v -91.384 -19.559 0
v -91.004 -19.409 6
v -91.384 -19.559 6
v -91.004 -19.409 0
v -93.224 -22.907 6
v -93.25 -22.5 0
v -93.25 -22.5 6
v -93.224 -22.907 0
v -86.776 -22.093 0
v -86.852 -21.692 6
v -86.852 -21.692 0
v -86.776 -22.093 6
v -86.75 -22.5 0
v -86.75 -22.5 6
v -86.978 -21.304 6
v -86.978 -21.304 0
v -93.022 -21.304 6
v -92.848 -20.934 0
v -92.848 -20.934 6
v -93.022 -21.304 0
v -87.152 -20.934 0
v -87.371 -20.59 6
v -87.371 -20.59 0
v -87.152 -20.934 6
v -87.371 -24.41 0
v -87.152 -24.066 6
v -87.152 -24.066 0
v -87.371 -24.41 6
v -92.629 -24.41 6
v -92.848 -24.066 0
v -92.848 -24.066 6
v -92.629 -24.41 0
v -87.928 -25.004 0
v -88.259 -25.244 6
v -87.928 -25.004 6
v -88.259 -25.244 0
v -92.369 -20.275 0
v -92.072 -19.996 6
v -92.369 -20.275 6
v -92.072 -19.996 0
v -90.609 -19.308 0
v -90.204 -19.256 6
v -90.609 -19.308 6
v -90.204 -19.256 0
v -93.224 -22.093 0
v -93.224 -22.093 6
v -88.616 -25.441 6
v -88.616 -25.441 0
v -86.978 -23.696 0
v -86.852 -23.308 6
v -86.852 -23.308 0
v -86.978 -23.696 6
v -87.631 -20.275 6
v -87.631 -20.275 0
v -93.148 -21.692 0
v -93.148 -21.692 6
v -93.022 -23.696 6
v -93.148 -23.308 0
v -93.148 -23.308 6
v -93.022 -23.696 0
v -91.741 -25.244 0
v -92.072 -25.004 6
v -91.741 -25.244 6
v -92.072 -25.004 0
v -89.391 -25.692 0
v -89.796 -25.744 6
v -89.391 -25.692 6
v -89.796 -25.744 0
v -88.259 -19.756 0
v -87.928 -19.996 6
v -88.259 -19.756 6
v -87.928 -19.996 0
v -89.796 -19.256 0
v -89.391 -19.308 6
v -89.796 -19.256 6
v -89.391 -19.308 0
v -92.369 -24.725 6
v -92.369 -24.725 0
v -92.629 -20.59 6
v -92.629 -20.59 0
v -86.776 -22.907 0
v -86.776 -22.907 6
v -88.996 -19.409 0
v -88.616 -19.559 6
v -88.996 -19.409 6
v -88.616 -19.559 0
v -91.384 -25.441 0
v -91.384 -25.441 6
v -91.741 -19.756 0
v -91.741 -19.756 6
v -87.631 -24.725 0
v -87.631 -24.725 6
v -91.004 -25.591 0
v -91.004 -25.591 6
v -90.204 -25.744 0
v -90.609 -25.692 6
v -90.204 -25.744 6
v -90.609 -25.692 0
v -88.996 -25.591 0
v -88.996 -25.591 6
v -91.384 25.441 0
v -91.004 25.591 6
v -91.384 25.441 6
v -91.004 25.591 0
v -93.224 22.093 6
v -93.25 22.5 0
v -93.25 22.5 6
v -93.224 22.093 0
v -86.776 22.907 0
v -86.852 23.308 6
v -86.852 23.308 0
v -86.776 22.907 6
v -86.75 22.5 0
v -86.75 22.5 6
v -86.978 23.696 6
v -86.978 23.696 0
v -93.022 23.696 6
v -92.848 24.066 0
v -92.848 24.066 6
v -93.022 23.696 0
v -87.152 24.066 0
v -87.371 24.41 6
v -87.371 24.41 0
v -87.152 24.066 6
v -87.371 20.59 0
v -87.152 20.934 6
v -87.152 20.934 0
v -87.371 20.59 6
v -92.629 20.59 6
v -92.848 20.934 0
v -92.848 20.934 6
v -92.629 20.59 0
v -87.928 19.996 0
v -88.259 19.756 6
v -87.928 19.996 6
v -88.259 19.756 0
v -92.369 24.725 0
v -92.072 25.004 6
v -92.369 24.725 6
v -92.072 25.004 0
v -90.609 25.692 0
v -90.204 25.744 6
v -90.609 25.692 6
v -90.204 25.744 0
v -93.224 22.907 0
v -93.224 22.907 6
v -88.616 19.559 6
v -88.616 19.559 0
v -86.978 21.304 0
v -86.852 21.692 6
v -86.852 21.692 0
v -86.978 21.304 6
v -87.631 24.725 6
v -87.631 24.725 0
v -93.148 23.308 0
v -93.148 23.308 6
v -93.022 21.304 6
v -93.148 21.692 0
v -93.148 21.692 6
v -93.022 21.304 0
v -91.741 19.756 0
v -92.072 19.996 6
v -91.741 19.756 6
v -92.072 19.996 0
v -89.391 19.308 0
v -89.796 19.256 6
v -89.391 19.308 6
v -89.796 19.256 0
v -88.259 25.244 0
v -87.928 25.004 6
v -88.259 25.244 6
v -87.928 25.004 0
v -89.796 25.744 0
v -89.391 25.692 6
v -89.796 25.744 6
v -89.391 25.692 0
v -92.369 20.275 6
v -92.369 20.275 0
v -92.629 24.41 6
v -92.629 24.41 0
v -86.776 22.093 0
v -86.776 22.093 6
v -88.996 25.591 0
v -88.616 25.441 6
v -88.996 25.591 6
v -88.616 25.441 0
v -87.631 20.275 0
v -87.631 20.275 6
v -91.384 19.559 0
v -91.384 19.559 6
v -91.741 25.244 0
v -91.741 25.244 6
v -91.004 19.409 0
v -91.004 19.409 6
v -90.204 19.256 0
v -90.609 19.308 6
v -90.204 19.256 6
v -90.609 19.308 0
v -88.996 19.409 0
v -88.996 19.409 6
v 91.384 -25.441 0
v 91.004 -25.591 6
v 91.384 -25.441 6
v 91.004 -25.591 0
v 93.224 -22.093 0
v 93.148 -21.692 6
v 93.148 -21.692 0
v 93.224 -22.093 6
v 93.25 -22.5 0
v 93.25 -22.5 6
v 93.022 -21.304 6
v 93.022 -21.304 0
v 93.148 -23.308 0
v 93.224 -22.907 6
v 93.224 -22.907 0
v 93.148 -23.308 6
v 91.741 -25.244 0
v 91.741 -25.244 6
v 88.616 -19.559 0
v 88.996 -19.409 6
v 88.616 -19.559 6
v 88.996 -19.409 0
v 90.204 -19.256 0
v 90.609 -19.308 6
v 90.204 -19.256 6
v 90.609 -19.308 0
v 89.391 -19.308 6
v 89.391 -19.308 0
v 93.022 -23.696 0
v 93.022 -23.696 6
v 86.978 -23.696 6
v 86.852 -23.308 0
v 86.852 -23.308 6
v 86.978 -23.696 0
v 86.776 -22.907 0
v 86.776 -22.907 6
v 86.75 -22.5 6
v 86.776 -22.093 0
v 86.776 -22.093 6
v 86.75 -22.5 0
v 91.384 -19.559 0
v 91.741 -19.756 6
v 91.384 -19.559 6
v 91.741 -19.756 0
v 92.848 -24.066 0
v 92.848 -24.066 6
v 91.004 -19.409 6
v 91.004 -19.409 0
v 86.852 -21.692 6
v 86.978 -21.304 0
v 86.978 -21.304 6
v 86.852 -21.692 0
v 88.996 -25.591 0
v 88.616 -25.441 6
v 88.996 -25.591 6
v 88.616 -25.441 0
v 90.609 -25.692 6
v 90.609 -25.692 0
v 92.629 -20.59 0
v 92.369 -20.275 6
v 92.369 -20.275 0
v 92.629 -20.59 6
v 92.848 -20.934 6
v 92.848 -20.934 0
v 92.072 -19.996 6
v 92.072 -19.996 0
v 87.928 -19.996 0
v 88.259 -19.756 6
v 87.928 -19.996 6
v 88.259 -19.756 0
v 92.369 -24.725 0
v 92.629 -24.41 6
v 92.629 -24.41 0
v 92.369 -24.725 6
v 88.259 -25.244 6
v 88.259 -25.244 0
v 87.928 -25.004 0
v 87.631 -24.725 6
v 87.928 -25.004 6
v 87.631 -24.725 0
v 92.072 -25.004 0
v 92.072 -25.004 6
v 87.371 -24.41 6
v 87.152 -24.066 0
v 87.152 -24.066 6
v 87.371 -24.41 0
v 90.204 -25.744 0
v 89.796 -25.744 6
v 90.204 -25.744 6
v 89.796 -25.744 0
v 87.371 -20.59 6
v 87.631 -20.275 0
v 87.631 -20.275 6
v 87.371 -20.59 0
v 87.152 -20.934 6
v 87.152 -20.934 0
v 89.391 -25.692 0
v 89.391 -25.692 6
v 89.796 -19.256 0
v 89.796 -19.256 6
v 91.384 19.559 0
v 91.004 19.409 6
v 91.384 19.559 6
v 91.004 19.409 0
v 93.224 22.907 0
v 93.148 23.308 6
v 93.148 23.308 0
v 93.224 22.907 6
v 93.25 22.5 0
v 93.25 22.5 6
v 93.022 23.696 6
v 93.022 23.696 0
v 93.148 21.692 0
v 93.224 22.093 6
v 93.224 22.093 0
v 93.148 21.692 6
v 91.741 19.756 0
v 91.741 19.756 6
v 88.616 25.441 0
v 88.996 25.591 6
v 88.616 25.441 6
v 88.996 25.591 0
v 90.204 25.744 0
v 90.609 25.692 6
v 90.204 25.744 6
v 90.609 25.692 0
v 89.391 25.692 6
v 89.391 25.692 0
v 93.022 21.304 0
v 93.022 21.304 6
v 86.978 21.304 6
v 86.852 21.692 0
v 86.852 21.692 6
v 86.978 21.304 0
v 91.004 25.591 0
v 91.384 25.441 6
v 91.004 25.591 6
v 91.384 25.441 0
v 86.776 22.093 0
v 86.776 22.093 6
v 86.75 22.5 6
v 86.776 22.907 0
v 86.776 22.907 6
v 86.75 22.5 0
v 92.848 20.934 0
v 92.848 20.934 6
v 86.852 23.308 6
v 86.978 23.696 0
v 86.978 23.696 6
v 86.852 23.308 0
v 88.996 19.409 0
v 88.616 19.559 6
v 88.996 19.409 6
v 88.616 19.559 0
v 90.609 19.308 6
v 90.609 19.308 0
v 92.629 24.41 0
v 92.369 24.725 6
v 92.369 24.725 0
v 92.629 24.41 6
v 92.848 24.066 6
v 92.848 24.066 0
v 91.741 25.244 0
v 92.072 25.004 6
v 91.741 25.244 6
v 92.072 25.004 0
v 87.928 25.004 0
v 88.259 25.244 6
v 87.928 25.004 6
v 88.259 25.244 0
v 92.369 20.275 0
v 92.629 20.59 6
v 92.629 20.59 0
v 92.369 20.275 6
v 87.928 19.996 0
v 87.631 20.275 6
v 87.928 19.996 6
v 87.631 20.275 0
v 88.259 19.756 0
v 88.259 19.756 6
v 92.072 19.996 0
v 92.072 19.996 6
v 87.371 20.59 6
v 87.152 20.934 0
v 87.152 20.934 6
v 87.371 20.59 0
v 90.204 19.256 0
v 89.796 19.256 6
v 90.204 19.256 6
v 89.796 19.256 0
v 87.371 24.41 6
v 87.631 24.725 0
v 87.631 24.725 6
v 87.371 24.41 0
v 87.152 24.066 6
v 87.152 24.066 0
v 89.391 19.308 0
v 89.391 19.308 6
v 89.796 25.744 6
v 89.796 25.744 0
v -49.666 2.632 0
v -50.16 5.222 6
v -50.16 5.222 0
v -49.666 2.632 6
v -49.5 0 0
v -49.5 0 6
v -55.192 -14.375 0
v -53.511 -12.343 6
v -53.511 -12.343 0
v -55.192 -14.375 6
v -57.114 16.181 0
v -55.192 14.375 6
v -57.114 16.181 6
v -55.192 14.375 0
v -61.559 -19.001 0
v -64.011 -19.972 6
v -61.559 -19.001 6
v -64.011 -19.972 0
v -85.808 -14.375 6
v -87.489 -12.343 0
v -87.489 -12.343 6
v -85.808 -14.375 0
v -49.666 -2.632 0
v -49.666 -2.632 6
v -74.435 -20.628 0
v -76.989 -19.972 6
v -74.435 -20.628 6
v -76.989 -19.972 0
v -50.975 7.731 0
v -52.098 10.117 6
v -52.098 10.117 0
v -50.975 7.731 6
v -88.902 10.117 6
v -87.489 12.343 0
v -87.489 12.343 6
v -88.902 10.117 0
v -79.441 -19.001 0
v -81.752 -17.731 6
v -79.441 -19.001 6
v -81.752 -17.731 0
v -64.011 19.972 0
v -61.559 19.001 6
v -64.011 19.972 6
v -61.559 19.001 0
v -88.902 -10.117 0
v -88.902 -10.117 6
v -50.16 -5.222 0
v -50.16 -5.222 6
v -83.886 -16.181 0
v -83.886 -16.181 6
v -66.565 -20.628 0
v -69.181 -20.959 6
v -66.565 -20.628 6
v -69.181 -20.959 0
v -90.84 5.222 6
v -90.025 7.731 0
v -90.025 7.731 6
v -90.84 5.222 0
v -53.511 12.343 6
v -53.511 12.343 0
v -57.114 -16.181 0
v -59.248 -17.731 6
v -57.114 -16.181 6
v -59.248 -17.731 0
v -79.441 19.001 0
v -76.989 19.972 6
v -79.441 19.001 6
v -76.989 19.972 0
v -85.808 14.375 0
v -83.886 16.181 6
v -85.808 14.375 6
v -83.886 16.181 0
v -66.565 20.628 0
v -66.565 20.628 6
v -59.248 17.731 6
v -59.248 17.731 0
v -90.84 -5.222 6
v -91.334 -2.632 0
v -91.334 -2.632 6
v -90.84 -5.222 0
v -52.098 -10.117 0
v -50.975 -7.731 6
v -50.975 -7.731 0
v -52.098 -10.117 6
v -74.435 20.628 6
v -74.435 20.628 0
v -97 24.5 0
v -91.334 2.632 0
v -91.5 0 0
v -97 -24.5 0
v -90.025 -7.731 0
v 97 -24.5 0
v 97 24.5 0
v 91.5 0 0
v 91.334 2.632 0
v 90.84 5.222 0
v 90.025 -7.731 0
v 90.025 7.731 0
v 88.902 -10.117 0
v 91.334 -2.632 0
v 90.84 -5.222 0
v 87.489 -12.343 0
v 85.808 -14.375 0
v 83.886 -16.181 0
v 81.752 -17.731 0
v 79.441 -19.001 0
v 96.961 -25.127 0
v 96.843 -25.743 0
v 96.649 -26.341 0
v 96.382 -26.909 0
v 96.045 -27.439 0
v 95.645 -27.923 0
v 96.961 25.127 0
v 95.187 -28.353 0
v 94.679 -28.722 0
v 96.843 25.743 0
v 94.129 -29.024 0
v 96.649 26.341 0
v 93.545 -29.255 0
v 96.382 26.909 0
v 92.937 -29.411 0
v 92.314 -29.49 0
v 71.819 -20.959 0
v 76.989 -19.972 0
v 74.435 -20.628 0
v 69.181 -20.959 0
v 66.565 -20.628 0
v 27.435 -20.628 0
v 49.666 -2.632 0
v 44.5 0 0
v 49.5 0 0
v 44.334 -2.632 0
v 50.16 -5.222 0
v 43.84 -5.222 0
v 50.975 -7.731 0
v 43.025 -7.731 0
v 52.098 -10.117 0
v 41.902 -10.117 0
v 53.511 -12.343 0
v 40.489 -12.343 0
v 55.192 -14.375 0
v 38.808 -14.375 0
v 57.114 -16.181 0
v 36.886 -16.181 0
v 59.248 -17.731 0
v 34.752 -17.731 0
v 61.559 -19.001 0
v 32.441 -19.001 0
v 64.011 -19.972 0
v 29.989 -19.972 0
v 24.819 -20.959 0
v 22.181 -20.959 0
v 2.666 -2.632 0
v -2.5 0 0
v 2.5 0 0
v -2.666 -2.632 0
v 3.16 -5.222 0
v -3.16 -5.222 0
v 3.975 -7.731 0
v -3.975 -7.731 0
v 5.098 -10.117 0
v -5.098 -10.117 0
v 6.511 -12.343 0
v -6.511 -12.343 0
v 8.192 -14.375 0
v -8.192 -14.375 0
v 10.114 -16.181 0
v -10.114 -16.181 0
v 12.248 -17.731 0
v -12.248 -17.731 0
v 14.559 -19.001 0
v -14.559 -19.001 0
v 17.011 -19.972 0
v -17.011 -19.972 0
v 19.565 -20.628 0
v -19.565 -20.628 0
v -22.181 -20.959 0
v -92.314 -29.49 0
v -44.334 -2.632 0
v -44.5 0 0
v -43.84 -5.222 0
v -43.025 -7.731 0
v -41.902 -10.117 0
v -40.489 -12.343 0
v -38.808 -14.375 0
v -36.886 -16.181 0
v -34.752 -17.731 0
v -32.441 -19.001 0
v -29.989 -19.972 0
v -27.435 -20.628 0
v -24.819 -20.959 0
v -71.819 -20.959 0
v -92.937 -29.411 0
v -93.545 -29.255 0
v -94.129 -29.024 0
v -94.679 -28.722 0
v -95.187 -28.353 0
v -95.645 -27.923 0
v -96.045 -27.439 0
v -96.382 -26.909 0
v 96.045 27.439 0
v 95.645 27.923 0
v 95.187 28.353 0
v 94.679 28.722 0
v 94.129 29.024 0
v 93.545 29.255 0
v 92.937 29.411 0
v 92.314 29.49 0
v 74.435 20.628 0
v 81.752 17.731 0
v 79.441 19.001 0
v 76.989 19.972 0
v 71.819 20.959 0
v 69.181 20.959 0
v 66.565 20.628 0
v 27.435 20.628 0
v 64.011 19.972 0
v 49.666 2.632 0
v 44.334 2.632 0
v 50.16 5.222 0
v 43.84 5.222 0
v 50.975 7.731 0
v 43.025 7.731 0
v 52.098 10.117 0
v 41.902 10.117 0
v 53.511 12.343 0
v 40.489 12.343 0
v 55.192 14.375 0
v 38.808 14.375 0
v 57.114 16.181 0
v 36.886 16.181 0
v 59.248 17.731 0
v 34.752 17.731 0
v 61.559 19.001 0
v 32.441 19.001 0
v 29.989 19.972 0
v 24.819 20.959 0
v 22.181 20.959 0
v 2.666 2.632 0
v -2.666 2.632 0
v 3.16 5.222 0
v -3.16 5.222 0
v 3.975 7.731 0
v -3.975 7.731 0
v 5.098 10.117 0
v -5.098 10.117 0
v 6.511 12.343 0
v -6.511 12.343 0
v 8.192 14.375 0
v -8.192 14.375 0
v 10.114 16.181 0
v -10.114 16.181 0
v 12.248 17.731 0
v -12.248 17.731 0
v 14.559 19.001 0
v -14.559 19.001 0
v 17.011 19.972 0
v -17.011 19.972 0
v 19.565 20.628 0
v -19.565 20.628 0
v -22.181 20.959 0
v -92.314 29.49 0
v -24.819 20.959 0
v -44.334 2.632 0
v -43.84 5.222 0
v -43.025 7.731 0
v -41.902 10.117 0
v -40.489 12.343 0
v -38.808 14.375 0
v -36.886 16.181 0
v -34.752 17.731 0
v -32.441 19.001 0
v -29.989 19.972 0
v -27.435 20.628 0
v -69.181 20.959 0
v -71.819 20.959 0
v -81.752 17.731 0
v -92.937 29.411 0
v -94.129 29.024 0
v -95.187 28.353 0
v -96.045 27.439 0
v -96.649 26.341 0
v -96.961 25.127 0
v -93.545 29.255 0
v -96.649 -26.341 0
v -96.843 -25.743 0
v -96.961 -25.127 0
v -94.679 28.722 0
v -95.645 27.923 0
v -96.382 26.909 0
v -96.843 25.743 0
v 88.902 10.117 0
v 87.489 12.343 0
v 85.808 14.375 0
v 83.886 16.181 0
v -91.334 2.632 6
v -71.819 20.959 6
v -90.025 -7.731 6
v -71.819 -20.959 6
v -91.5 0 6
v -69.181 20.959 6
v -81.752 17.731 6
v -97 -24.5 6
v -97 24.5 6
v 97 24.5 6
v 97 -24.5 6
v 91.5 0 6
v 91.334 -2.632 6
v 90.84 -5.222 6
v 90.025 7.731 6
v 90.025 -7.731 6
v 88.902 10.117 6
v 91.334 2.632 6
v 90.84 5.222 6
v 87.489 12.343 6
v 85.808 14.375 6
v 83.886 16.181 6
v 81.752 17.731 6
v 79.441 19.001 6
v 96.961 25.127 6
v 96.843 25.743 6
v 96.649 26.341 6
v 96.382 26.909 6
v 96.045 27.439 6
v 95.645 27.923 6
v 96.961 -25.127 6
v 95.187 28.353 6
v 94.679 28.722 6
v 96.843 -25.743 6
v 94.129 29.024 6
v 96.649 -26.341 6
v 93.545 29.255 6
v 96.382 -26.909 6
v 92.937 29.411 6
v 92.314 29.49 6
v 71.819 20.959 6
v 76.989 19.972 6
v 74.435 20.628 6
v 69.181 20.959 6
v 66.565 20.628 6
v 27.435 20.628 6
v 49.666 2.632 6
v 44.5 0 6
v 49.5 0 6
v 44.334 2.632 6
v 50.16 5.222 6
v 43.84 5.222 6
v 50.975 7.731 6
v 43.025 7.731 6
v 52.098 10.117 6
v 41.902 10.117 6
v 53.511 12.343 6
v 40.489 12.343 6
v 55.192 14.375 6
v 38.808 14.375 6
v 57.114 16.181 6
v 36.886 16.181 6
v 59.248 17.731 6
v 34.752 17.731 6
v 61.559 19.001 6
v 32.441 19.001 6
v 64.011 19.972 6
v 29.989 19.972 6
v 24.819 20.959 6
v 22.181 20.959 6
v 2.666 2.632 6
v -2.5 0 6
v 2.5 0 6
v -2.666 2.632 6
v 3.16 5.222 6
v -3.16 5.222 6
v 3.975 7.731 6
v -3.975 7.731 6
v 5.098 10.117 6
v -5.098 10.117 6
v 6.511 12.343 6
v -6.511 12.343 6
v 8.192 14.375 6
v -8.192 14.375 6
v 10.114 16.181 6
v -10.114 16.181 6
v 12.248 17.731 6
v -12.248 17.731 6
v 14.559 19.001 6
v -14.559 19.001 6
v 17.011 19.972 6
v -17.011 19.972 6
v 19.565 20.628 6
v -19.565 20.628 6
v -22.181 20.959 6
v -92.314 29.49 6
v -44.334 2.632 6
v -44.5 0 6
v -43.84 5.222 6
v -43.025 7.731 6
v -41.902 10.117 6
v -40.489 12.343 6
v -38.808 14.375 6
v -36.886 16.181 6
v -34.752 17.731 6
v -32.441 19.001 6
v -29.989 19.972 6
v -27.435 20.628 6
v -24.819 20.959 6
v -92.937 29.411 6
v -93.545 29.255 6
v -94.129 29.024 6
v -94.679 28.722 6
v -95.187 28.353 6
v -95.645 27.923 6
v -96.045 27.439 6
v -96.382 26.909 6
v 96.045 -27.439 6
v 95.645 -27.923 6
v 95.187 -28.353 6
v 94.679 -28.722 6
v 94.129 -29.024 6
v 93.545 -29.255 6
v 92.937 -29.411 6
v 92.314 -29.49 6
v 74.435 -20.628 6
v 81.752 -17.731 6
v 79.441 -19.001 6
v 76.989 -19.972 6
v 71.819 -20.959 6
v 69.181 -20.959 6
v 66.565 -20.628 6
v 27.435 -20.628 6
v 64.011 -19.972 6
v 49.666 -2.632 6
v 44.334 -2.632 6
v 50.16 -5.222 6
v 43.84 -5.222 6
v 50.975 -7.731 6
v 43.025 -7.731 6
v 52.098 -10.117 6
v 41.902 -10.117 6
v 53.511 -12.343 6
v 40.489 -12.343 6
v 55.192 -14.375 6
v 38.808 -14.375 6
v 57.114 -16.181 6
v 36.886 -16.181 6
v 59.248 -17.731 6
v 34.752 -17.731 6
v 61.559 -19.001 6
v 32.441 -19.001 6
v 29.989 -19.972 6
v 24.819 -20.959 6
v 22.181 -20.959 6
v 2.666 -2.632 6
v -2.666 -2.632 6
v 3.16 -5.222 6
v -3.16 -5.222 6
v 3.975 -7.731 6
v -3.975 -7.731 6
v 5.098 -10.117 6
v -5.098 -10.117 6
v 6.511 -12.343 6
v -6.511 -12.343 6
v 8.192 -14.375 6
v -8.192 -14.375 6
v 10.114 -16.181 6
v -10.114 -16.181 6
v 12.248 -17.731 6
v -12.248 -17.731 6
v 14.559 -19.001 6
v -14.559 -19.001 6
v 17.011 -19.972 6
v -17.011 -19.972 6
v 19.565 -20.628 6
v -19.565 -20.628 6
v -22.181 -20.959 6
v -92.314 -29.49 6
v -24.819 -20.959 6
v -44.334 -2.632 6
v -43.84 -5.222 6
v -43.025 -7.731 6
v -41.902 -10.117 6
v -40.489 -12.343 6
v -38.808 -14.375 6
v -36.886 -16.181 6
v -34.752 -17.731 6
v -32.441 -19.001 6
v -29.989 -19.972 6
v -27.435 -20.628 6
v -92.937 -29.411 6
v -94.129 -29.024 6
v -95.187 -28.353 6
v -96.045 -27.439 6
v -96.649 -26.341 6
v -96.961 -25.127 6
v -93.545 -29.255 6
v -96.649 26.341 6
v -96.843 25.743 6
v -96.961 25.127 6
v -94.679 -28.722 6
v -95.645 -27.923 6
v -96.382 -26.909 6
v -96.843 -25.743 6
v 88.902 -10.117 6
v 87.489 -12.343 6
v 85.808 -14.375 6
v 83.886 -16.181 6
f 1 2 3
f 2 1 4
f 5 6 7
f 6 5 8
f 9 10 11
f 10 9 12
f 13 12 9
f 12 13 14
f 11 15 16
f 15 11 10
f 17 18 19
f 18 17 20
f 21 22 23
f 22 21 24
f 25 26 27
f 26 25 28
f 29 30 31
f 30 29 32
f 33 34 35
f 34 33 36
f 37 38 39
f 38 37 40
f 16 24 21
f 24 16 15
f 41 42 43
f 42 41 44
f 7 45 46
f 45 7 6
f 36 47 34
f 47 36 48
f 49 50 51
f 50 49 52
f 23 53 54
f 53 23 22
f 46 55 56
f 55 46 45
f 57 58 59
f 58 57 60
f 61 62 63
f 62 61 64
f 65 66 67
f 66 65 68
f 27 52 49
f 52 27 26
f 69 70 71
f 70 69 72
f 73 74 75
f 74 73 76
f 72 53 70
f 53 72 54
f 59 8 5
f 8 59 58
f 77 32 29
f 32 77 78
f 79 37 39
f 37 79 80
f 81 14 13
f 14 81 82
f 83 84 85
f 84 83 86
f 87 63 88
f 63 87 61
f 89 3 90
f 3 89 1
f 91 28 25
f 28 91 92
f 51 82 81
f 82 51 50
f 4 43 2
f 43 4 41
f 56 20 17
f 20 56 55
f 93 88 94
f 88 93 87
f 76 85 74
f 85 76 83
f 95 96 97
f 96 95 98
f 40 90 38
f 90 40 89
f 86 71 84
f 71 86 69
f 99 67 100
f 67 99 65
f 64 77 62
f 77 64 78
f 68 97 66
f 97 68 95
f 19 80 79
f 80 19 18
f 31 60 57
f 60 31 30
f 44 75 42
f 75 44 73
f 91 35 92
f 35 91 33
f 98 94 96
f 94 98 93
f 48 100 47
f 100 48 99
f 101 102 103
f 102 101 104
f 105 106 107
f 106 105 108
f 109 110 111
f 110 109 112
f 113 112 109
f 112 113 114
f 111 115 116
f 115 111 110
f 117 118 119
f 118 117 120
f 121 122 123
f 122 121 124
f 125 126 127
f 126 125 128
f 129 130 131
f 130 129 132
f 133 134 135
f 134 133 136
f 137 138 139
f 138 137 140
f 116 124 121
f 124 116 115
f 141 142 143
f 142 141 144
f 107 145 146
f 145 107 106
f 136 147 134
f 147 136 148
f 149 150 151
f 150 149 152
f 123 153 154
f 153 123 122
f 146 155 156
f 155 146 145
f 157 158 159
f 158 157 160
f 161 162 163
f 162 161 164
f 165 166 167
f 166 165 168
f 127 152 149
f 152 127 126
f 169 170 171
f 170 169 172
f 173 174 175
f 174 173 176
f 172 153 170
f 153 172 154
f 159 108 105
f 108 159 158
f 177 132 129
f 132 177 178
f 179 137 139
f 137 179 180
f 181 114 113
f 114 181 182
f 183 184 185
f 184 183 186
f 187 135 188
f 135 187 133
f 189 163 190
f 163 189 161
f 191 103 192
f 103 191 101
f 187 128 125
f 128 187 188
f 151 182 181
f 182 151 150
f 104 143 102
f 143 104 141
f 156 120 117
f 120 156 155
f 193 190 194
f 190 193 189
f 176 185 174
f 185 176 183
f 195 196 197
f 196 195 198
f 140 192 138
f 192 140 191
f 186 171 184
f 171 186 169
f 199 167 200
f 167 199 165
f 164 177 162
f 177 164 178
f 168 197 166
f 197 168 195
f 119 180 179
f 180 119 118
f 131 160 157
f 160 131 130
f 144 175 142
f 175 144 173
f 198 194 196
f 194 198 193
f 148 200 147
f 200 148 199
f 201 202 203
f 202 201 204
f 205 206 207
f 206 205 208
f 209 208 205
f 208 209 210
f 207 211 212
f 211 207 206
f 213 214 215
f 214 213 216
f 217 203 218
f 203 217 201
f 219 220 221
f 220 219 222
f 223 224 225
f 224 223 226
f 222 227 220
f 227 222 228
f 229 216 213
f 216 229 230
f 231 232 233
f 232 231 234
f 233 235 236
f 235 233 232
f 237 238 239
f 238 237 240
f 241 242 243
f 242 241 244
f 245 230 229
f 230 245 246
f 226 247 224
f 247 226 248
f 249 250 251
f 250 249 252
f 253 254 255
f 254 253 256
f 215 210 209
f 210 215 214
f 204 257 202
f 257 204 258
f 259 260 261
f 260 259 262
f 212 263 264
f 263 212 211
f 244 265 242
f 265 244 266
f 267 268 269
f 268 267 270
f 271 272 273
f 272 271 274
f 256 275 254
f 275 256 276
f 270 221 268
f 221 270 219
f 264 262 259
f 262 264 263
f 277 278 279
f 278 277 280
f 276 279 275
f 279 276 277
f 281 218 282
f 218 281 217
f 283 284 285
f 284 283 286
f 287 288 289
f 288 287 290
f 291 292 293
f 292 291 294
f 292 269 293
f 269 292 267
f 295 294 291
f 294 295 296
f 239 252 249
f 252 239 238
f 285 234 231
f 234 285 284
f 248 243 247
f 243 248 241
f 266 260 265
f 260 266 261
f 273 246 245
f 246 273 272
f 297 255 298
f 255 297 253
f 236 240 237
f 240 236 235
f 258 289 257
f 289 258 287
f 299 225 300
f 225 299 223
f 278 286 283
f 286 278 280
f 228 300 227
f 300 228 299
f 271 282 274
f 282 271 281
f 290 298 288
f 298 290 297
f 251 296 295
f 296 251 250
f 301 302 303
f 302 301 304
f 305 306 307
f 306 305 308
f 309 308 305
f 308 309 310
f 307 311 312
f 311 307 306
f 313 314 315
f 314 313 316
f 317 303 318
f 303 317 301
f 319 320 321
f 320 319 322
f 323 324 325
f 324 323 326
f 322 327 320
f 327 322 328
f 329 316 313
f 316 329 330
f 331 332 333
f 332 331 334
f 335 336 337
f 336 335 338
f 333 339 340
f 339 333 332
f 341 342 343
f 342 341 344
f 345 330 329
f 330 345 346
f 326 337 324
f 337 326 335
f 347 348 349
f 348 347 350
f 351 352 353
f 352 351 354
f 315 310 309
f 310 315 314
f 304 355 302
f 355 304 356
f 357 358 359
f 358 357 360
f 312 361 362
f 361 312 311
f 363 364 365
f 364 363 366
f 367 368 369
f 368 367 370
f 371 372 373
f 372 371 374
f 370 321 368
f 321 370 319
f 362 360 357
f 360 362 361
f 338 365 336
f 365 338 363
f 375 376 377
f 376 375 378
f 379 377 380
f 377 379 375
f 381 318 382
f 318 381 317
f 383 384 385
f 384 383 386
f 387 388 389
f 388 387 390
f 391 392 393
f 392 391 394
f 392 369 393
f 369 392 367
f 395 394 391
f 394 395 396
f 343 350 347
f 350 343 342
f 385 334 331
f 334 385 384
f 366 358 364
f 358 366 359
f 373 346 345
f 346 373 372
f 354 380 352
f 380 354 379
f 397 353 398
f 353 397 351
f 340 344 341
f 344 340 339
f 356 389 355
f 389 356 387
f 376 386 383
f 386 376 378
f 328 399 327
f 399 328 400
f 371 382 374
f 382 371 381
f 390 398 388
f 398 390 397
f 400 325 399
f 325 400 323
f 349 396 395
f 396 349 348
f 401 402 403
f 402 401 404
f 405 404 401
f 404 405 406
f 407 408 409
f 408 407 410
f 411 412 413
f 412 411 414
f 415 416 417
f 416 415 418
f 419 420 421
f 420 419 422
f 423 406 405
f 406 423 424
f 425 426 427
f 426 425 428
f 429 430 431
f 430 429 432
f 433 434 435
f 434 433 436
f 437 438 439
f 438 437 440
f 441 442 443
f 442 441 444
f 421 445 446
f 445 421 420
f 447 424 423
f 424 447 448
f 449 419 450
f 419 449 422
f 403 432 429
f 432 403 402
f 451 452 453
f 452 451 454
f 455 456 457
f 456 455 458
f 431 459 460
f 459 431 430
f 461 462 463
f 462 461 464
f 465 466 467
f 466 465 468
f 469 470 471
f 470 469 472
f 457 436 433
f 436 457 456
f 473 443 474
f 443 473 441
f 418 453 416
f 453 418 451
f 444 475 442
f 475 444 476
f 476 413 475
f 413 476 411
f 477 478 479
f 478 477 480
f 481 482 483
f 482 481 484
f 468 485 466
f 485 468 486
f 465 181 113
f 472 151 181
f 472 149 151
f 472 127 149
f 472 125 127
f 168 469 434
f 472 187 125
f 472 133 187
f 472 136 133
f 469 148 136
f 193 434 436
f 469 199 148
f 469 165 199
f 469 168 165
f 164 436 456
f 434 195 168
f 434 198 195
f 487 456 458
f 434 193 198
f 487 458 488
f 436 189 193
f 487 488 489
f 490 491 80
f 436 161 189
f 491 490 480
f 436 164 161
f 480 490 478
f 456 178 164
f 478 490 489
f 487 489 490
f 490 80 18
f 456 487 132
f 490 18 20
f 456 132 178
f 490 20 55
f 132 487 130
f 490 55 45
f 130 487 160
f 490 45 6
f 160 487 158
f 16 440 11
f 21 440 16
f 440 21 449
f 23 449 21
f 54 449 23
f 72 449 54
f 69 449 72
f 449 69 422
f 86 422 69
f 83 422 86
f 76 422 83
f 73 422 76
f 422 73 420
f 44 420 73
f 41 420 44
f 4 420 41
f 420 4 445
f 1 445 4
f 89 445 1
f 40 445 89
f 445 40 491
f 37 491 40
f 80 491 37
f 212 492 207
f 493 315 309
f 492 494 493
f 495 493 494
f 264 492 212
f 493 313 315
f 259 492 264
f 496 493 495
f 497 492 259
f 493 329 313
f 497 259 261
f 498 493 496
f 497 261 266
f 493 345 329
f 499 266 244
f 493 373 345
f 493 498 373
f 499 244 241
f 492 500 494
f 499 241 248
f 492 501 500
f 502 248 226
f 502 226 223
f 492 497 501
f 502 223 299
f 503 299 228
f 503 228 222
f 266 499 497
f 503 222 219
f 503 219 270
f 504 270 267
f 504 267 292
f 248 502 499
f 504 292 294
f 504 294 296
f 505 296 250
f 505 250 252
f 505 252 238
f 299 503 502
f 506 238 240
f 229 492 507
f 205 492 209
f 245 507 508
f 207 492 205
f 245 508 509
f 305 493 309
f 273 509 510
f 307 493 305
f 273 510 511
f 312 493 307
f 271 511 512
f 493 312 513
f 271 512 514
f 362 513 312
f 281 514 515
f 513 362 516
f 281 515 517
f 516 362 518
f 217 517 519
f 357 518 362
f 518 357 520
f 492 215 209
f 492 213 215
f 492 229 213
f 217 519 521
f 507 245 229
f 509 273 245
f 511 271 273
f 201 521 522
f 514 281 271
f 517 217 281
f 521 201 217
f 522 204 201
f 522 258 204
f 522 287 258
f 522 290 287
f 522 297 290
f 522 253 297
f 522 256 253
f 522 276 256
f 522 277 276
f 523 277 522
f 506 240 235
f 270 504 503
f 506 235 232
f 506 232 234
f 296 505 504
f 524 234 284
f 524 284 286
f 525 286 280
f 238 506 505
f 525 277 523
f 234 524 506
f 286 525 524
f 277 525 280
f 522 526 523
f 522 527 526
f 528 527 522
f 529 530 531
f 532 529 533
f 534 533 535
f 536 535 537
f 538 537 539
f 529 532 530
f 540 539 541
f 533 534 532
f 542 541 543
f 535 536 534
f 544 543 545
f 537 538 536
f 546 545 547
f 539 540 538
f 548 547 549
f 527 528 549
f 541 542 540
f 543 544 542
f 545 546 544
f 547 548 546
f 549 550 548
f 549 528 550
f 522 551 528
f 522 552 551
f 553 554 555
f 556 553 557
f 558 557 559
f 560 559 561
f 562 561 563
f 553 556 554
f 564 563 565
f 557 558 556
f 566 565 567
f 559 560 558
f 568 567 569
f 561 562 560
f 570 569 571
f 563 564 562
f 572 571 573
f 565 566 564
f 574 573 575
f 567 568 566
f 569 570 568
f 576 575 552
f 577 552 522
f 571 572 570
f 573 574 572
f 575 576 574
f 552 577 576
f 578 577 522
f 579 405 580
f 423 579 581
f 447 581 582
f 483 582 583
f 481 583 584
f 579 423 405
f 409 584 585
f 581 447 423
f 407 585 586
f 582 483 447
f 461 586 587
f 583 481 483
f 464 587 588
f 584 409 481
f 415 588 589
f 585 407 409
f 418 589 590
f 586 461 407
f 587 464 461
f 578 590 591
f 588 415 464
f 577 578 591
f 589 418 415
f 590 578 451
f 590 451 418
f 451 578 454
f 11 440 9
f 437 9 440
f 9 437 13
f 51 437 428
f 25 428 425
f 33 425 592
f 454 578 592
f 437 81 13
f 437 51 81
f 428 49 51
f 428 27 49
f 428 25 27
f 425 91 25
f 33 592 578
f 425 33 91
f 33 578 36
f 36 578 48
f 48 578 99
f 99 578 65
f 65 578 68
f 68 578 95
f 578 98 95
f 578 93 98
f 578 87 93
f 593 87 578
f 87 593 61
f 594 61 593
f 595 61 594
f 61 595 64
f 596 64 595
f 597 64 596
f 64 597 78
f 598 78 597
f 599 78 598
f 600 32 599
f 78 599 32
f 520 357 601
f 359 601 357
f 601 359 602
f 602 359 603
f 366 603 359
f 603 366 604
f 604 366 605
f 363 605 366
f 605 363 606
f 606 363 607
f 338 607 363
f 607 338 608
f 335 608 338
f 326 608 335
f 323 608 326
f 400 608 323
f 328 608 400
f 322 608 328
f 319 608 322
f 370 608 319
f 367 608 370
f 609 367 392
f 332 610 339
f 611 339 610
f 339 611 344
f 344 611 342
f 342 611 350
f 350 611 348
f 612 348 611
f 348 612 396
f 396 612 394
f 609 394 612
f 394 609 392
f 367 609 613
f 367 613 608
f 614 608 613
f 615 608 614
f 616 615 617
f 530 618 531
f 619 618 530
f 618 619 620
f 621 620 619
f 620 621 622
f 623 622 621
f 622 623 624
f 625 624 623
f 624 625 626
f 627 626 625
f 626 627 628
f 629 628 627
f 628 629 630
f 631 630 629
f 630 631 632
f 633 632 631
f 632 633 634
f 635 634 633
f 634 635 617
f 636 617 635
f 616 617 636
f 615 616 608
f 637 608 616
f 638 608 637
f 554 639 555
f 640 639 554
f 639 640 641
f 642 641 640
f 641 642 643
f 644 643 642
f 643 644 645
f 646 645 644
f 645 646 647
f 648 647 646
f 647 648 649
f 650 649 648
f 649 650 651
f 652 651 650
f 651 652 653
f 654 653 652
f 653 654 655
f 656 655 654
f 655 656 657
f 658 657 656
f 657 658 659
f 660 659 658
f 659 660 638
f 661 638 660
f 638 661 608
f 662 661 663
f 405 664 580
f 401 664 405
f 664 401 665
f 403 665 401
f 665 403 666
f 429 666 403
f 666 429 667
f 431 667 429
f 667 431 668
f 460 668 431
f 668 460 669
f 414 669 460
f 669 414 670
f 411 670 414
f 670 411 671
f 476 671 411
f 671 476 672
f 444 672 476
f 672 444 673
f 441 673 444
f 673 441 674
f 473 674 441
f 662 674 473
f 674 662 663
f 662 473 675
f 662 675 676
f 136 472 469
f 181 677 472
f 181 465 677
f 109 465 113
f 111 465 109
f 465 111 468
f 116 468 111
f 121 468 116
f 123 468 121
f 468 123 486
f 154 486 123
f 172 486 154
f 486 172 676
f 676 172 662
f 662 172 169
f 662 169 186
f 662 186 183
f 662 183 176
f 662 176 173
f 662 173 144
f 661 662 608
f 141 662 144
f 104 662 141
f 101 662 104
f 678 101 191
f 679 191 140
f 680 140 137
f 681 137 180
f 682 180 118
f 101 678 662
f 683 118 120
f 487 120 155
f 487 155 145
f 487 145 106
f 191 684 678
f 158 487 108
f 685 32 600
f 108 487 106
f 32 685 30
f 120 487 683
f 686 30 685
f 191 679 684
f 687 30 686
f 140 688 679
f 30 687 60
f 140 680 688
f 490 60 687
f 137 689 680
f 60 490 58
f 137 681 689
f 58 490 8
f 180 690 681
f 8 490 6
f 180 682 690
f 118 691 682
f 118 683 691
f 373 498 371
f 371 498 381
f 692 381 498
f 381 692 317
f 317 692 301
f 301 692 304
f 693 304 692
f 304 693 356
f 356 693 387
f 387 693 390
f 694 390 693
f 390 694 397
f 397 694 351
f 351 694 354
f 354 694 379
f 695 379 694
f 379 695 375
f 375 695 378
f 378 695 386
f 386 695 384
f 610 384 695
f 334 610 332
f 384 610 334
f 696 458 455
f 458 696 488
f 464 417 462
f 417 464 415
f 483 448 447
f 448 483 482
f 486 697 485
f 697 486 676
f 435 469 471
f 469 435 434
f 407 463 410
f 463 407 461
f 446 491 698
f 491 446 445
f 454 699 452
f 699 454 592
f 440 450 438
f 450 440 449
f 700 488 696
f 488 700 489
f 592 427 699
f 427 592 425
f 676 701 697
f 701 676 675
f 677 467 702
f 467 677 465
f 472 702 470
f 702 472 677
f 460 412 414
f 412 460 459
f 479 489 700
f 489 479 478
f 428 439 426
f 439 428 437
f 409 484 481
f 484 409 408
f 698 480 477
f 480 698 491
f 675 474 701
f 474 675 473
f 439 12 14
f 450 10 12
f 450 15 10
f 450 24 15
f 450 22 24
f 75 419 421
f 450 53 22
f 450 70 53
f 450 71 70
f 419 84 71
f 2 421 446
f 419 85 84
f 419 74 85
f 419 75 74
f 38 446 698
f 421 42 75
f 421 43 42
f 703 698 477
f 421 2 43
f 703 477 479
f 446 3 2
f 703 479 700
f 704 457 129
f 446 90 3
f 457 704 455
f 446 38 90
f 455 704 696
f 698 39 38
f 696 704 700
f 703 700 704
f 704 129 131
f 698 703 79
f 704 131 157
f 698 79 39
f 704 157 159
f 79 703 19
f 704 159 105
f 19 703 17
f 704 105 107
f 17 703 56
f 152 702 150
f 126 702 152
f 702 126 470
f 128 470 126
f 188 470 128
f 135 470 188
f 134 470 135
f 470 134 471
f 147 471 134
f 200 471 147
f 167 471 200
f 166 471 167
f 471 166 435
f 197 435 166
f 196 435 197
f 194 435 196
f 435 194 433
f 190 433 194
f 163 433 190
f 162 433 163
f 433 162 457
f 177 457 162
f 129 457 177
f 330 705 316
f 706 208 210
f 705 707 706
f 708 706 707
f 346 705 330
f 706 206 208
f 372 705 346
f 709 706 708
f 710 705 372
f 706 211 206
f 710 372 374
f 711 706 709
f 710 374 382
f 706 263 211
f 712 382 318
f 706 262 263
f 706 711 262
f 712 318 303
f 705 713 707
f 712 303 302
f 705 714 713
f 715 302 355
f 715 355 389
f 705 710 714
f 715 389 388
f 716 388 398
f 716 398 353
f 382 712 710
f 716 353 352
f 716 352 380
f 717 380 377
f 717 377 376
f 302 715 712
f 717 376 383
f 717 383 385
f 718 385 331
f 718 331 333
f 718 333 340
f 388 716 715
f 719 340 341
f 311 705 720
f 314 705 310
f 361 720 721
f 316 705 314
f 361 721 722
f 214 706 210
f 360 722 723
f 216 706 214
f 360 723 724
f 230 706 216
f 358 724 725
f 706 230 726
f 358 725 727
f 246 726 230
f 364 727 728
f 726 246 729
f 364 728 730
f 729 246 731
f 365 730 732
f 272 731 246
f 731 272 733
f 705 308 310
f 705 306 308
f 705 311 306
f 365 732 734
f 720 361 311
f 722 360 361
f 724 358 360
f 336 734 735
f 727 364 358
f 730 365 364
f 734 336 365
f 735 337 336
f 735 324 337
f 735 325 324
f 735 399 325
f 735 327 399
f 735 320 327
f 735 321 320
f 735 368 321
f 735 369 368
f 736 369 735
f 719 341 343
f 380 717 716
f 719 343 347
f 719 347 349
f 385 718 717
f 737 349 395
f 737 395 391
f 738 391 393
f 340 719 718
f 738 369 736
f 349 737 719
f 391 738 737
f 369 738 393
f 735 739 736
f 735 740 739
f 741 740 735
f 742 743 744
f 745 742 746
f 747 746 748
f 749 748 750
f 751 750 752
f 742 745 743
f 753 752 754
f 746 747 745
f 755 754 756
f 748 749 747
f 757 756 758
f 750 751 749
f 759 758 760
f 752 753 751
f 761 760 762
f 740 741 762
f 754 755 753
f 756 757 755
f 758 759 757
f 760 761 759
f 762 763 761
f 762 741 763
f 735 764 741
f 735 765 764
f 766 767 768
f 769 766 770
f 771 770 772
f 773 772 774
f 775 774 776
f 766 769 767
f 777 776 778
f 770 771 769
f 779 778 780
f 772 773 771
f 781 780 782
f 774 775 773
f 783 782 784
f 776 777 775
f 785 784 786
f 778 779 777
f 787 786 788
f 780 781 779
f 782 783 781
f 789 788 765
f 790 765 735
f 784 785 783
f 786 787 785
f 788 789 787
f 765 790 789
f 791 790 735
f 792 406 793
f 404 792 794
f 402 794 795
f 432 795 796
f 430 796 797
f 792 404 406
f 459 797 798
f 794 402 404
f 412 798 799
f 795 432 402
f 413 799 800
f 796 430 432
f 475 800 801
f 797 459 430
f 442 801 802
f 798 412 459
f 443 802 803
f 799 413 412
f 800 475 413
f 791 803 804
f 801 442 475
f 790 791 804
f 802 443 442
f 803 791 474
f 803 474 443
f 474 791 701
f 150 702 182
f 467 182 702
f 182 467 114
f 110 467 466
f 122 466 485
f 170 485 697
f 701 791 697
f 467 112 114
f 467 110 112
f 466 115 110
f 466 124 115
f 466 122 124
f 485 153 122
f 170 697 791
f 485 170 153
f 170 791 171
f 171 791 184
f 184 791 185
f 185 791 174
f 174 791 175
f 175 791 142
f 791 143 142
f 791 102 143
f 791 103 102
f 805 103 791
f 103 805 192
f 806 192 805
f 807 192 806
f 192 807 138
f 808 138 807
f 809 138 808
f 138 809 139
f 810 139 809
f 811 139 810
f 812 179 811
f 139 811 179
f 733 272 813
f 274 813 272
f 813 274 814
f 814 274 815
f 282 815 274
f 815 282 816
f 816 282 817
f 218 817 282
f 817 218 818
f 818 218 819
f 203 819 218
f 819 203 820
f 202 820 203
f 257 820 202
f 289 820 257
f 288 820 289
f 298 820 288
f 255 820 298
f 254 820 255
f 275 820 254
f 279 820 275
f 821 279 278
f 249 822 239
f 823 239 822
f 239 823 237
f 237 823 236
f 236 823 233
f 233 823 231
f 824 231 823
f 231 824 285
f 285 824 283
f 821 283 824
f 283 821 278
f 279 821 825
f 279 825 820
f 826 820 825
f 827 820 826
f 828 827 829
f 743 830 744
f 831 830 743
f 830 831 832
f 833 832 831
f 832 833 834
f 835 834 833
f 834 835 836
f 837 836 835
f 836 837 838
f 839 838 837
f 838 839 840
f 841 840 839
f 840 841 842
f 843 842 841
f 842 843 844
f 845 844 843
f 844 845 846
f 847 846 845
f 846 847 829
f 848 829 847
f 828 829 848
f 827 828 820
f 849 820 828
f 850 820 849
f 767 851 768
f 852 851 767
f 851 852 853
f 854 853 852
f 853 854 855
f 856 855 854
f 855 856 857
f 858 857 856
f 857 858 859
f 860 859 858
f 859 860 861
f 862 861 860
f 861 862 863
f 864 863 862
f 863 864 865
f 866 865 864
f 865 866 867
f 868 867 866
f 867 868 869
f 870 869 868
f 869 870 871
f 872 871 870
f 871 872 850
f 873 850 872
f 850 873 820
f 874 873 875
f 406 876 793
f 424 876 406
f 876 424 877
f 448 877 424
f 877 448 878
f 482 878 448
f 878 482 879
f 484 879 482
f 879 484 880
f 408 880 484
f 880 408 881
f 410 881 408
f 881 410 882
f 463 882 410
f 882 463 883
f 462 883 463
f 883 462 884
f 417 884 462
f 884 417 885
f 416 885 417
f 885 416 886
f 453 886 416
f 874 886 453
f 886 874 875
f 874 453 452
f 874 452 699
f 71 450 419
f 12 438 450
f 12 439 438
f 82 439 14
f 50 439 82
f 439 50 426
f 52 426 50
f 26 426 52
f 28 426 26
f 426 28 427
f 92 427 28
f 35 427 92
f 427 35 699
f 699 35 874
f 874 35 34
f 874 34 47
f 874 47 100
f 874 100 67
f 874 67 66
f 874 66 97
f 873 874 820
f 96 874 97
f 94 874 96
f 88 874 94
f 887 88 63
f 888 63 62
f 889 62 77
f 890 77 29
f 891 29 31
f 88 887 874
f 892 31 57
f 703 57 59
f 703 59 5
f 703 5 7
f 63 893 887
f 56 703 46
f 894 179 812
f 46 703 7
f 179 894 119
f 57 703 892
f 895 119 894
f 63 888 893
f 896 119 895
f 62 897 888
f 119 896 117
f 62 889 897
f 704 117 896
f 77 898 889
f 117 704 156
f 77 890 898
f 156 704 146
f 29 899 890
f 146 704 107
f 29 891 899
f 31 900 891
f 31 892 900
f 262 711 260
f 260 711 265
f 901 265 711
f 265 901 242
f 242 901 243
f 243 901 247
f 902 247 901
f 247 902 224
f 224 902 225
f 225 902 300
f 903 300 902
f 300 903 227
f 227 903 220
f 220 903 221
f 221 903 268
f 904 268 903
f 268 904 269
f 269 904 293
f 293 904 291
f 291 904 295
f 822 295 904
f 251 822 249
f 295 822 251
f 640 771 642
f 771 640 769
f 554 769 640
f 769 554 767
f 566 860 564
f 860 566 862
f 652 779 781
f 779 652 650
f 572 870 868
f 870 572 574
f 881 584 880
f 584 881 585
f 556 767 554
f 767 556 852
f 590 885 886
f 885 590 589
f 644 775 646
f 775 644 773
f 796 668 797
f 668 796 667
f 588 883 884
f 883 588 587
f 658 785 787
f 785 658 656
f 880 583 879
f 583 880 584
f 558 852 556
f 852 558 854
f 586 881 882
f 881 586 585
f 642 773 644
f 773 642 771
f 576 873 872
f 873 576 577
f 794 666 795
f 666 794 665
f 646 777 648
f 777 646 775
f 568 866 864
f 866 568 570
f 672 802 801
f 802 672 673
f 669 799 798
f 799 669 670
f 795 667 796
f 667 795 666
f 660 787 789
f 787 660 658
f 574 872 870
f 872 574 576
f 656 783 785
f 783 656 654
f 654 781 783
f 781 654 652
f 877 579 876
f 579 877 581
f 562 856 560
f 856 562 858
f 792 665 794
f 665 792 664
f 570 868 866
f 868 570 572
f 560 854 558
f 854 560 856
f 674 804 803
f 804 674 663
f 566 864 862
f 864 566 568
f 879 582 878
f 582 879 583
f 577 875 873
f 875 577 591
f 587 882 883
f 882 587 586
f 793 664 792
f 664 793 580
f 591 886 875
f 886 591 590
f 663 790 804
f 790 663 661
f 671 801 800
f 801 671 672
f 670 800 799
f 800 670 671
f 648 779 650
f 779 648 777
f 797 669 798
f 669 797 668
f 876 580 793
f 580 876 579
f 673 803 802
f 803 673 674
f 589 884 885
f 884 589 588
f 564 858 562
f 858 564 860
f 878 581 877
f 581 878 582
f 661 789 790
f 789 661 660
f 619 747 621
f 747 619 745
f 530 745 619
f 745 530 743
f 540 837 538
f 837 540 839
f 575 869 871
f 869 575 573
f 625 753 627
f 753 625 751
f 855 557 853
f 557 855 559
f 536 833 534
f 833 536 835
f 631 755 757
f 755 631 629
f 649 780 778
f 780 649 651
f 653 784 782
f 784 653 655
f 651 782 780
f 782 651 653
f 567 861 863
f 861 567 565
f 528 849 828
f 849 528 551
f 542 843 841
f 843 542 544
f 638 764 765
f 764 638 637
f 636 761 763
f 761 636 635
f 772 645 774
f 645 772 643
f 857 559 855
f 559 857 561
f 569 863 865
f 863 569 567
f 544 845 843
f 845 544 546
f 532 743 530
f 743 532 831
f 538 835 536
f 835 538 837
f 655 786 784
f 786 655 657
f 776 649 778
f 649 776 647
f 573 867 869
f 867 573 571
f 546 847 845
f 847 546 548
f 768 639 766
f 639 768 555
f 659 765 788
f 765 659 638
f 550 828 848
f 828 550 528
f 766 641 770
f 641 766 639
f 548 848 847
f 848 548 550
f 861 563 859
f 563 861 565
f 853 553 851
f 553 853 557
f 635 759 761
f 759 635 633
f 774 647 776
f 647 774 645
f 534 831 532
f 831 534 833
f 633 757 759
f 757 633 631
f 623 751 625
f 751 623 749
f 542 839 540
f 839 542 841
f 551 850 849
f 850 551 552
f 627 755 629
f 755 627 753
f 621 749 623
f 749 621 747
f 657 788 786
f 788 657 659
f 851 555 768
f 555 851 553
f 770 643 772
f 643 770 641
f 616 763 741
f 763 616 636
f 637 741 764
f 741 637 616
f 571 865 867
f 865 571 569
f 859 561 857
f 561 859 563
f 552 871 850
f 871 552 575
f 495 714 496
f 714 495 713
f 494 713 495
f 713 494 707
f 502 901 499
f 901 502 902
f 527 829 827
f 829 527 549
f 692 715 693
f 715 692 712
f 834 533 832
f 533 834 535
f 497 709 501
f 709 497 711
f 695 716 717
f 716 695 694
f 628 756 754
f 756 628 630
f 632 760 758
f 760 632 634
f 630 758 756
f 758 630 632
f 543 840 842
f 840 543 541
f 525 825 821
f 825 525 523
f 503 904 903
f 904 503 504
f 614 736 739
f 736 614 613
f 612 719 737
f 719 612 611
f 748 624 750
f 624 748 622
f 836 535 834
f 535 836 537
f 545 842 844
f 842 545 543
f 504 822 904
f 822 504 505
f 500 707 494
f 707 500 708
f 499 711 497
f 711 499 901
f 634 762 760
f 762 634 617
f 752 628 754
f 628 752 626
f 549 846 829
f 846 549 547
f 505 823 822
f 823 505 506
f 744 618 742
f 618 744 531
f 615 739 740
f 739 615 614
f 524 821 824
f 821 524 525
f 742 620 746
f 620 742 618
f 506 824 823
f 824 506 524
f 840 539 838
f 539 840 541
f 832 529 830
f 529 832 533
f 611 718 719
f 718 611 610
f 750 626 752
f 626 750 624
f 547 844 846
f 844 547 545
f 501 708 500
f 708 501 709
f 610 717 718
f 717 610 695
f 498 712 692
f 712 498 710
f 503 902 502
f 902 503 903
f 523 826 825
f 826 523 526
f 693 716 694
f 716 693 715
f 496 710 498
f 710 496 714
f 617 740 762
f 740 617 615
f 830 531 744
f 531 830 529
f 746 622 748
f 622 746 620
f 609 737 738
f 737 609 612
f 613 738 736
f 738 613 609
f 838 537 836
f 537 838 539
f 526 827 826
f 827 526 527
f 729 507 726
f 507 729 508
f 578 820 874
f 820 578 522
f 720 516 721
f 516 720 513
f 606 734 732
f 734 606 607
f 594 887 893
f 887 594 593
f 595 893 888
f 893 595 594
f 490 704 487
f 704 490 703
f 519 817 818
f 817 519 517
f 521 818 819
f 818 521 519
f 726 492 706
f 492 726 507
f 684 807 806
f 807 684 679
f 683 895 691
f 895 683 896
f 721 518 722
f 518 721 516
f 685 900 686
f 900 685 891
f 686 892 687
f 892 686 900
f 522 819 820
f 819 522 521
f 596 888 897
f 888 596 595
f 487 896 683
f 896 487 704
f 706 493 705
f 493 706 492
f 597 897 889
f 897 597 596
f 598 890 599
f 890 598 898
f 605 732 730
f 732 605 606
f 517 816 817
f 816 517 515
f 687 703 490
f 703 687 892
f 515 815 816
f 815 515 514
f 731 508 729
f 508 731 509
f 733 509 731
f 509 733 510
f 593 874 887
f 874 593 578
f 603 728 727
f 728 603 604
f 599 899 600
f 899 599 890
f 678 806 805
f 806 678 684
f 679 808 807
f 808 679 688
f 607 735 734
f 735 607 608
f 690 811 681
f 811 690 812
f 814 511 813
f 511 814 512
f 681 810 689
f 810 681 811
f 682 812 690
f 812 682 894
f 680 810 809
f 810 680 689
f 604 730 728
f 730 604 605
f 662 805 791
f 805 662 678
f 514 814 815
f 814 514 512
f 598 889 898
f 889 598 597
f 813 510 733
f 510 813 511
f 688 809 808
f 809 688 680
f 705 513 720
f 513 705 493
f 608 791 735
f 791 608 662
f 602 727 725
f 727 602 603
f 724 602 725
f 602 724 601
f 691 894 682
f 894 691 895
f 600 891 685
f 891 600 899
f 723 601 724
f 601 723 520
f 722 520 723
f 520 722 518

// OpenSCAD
$fn = 50;


difference() {
	union() {
		hull() {
			translate(v = [-92.0000000000, 24.5000000000, 0]) {
				cylinder(h = 6, r = 5);
			}
			translate(v = [92.0000000000, 24.5000000000, 0]) {
				cylinder(h = 6, r = 5);
			}
			translate(v = [-92.0000000000, -24.5000000000, 0]) {
				cylinder(h = 6, r = 5);
			}
			translate(v = [92.0000000000, -24.5000000000, 0]) {
				cylinder(h = 6, r = 5);
			}
		}
	}
	union() {
		#translate(v = [-90.0000000000, -22.5000000000, -100.0000000000]) {
			cylinder(h = 200, r = 3.2500000000);
		}
		#translate(v = [-90.0000000000, 22.5000000000, -100.0000000000]) {
			cylinder(h = 200, r = 3.2500000000);
		}
		#translate(v = [90.0000000000, -22.5000000000, -100.0000000000]) {
			cylinder(h = 200, r = 3.2500000000);
		}
		#translate(v = [90.0000000000, 22.5000000000, -100.0000000000]) {
			cylinder(h = 200, r = 3.2500000000);
		}
		#translate(v = [-70.5000000000, 0, 0]) {
			cylinder(h = 6, r = 21.0000000000);
		}
		#translate(v = [-23.5000000000, 0, 0]) {
			cylinder(h = 6, r = 21.0000000000);
		}
		#translate(v = [23.5000000000, 0, 0]) {
			cylinder(h = 6, r = 21.0000000000);
		}
		#translate(v = [70.5000000000, 0, 0]) {
			cylinder(h = 6, r = 21.0000000000);
		}
	}
}
